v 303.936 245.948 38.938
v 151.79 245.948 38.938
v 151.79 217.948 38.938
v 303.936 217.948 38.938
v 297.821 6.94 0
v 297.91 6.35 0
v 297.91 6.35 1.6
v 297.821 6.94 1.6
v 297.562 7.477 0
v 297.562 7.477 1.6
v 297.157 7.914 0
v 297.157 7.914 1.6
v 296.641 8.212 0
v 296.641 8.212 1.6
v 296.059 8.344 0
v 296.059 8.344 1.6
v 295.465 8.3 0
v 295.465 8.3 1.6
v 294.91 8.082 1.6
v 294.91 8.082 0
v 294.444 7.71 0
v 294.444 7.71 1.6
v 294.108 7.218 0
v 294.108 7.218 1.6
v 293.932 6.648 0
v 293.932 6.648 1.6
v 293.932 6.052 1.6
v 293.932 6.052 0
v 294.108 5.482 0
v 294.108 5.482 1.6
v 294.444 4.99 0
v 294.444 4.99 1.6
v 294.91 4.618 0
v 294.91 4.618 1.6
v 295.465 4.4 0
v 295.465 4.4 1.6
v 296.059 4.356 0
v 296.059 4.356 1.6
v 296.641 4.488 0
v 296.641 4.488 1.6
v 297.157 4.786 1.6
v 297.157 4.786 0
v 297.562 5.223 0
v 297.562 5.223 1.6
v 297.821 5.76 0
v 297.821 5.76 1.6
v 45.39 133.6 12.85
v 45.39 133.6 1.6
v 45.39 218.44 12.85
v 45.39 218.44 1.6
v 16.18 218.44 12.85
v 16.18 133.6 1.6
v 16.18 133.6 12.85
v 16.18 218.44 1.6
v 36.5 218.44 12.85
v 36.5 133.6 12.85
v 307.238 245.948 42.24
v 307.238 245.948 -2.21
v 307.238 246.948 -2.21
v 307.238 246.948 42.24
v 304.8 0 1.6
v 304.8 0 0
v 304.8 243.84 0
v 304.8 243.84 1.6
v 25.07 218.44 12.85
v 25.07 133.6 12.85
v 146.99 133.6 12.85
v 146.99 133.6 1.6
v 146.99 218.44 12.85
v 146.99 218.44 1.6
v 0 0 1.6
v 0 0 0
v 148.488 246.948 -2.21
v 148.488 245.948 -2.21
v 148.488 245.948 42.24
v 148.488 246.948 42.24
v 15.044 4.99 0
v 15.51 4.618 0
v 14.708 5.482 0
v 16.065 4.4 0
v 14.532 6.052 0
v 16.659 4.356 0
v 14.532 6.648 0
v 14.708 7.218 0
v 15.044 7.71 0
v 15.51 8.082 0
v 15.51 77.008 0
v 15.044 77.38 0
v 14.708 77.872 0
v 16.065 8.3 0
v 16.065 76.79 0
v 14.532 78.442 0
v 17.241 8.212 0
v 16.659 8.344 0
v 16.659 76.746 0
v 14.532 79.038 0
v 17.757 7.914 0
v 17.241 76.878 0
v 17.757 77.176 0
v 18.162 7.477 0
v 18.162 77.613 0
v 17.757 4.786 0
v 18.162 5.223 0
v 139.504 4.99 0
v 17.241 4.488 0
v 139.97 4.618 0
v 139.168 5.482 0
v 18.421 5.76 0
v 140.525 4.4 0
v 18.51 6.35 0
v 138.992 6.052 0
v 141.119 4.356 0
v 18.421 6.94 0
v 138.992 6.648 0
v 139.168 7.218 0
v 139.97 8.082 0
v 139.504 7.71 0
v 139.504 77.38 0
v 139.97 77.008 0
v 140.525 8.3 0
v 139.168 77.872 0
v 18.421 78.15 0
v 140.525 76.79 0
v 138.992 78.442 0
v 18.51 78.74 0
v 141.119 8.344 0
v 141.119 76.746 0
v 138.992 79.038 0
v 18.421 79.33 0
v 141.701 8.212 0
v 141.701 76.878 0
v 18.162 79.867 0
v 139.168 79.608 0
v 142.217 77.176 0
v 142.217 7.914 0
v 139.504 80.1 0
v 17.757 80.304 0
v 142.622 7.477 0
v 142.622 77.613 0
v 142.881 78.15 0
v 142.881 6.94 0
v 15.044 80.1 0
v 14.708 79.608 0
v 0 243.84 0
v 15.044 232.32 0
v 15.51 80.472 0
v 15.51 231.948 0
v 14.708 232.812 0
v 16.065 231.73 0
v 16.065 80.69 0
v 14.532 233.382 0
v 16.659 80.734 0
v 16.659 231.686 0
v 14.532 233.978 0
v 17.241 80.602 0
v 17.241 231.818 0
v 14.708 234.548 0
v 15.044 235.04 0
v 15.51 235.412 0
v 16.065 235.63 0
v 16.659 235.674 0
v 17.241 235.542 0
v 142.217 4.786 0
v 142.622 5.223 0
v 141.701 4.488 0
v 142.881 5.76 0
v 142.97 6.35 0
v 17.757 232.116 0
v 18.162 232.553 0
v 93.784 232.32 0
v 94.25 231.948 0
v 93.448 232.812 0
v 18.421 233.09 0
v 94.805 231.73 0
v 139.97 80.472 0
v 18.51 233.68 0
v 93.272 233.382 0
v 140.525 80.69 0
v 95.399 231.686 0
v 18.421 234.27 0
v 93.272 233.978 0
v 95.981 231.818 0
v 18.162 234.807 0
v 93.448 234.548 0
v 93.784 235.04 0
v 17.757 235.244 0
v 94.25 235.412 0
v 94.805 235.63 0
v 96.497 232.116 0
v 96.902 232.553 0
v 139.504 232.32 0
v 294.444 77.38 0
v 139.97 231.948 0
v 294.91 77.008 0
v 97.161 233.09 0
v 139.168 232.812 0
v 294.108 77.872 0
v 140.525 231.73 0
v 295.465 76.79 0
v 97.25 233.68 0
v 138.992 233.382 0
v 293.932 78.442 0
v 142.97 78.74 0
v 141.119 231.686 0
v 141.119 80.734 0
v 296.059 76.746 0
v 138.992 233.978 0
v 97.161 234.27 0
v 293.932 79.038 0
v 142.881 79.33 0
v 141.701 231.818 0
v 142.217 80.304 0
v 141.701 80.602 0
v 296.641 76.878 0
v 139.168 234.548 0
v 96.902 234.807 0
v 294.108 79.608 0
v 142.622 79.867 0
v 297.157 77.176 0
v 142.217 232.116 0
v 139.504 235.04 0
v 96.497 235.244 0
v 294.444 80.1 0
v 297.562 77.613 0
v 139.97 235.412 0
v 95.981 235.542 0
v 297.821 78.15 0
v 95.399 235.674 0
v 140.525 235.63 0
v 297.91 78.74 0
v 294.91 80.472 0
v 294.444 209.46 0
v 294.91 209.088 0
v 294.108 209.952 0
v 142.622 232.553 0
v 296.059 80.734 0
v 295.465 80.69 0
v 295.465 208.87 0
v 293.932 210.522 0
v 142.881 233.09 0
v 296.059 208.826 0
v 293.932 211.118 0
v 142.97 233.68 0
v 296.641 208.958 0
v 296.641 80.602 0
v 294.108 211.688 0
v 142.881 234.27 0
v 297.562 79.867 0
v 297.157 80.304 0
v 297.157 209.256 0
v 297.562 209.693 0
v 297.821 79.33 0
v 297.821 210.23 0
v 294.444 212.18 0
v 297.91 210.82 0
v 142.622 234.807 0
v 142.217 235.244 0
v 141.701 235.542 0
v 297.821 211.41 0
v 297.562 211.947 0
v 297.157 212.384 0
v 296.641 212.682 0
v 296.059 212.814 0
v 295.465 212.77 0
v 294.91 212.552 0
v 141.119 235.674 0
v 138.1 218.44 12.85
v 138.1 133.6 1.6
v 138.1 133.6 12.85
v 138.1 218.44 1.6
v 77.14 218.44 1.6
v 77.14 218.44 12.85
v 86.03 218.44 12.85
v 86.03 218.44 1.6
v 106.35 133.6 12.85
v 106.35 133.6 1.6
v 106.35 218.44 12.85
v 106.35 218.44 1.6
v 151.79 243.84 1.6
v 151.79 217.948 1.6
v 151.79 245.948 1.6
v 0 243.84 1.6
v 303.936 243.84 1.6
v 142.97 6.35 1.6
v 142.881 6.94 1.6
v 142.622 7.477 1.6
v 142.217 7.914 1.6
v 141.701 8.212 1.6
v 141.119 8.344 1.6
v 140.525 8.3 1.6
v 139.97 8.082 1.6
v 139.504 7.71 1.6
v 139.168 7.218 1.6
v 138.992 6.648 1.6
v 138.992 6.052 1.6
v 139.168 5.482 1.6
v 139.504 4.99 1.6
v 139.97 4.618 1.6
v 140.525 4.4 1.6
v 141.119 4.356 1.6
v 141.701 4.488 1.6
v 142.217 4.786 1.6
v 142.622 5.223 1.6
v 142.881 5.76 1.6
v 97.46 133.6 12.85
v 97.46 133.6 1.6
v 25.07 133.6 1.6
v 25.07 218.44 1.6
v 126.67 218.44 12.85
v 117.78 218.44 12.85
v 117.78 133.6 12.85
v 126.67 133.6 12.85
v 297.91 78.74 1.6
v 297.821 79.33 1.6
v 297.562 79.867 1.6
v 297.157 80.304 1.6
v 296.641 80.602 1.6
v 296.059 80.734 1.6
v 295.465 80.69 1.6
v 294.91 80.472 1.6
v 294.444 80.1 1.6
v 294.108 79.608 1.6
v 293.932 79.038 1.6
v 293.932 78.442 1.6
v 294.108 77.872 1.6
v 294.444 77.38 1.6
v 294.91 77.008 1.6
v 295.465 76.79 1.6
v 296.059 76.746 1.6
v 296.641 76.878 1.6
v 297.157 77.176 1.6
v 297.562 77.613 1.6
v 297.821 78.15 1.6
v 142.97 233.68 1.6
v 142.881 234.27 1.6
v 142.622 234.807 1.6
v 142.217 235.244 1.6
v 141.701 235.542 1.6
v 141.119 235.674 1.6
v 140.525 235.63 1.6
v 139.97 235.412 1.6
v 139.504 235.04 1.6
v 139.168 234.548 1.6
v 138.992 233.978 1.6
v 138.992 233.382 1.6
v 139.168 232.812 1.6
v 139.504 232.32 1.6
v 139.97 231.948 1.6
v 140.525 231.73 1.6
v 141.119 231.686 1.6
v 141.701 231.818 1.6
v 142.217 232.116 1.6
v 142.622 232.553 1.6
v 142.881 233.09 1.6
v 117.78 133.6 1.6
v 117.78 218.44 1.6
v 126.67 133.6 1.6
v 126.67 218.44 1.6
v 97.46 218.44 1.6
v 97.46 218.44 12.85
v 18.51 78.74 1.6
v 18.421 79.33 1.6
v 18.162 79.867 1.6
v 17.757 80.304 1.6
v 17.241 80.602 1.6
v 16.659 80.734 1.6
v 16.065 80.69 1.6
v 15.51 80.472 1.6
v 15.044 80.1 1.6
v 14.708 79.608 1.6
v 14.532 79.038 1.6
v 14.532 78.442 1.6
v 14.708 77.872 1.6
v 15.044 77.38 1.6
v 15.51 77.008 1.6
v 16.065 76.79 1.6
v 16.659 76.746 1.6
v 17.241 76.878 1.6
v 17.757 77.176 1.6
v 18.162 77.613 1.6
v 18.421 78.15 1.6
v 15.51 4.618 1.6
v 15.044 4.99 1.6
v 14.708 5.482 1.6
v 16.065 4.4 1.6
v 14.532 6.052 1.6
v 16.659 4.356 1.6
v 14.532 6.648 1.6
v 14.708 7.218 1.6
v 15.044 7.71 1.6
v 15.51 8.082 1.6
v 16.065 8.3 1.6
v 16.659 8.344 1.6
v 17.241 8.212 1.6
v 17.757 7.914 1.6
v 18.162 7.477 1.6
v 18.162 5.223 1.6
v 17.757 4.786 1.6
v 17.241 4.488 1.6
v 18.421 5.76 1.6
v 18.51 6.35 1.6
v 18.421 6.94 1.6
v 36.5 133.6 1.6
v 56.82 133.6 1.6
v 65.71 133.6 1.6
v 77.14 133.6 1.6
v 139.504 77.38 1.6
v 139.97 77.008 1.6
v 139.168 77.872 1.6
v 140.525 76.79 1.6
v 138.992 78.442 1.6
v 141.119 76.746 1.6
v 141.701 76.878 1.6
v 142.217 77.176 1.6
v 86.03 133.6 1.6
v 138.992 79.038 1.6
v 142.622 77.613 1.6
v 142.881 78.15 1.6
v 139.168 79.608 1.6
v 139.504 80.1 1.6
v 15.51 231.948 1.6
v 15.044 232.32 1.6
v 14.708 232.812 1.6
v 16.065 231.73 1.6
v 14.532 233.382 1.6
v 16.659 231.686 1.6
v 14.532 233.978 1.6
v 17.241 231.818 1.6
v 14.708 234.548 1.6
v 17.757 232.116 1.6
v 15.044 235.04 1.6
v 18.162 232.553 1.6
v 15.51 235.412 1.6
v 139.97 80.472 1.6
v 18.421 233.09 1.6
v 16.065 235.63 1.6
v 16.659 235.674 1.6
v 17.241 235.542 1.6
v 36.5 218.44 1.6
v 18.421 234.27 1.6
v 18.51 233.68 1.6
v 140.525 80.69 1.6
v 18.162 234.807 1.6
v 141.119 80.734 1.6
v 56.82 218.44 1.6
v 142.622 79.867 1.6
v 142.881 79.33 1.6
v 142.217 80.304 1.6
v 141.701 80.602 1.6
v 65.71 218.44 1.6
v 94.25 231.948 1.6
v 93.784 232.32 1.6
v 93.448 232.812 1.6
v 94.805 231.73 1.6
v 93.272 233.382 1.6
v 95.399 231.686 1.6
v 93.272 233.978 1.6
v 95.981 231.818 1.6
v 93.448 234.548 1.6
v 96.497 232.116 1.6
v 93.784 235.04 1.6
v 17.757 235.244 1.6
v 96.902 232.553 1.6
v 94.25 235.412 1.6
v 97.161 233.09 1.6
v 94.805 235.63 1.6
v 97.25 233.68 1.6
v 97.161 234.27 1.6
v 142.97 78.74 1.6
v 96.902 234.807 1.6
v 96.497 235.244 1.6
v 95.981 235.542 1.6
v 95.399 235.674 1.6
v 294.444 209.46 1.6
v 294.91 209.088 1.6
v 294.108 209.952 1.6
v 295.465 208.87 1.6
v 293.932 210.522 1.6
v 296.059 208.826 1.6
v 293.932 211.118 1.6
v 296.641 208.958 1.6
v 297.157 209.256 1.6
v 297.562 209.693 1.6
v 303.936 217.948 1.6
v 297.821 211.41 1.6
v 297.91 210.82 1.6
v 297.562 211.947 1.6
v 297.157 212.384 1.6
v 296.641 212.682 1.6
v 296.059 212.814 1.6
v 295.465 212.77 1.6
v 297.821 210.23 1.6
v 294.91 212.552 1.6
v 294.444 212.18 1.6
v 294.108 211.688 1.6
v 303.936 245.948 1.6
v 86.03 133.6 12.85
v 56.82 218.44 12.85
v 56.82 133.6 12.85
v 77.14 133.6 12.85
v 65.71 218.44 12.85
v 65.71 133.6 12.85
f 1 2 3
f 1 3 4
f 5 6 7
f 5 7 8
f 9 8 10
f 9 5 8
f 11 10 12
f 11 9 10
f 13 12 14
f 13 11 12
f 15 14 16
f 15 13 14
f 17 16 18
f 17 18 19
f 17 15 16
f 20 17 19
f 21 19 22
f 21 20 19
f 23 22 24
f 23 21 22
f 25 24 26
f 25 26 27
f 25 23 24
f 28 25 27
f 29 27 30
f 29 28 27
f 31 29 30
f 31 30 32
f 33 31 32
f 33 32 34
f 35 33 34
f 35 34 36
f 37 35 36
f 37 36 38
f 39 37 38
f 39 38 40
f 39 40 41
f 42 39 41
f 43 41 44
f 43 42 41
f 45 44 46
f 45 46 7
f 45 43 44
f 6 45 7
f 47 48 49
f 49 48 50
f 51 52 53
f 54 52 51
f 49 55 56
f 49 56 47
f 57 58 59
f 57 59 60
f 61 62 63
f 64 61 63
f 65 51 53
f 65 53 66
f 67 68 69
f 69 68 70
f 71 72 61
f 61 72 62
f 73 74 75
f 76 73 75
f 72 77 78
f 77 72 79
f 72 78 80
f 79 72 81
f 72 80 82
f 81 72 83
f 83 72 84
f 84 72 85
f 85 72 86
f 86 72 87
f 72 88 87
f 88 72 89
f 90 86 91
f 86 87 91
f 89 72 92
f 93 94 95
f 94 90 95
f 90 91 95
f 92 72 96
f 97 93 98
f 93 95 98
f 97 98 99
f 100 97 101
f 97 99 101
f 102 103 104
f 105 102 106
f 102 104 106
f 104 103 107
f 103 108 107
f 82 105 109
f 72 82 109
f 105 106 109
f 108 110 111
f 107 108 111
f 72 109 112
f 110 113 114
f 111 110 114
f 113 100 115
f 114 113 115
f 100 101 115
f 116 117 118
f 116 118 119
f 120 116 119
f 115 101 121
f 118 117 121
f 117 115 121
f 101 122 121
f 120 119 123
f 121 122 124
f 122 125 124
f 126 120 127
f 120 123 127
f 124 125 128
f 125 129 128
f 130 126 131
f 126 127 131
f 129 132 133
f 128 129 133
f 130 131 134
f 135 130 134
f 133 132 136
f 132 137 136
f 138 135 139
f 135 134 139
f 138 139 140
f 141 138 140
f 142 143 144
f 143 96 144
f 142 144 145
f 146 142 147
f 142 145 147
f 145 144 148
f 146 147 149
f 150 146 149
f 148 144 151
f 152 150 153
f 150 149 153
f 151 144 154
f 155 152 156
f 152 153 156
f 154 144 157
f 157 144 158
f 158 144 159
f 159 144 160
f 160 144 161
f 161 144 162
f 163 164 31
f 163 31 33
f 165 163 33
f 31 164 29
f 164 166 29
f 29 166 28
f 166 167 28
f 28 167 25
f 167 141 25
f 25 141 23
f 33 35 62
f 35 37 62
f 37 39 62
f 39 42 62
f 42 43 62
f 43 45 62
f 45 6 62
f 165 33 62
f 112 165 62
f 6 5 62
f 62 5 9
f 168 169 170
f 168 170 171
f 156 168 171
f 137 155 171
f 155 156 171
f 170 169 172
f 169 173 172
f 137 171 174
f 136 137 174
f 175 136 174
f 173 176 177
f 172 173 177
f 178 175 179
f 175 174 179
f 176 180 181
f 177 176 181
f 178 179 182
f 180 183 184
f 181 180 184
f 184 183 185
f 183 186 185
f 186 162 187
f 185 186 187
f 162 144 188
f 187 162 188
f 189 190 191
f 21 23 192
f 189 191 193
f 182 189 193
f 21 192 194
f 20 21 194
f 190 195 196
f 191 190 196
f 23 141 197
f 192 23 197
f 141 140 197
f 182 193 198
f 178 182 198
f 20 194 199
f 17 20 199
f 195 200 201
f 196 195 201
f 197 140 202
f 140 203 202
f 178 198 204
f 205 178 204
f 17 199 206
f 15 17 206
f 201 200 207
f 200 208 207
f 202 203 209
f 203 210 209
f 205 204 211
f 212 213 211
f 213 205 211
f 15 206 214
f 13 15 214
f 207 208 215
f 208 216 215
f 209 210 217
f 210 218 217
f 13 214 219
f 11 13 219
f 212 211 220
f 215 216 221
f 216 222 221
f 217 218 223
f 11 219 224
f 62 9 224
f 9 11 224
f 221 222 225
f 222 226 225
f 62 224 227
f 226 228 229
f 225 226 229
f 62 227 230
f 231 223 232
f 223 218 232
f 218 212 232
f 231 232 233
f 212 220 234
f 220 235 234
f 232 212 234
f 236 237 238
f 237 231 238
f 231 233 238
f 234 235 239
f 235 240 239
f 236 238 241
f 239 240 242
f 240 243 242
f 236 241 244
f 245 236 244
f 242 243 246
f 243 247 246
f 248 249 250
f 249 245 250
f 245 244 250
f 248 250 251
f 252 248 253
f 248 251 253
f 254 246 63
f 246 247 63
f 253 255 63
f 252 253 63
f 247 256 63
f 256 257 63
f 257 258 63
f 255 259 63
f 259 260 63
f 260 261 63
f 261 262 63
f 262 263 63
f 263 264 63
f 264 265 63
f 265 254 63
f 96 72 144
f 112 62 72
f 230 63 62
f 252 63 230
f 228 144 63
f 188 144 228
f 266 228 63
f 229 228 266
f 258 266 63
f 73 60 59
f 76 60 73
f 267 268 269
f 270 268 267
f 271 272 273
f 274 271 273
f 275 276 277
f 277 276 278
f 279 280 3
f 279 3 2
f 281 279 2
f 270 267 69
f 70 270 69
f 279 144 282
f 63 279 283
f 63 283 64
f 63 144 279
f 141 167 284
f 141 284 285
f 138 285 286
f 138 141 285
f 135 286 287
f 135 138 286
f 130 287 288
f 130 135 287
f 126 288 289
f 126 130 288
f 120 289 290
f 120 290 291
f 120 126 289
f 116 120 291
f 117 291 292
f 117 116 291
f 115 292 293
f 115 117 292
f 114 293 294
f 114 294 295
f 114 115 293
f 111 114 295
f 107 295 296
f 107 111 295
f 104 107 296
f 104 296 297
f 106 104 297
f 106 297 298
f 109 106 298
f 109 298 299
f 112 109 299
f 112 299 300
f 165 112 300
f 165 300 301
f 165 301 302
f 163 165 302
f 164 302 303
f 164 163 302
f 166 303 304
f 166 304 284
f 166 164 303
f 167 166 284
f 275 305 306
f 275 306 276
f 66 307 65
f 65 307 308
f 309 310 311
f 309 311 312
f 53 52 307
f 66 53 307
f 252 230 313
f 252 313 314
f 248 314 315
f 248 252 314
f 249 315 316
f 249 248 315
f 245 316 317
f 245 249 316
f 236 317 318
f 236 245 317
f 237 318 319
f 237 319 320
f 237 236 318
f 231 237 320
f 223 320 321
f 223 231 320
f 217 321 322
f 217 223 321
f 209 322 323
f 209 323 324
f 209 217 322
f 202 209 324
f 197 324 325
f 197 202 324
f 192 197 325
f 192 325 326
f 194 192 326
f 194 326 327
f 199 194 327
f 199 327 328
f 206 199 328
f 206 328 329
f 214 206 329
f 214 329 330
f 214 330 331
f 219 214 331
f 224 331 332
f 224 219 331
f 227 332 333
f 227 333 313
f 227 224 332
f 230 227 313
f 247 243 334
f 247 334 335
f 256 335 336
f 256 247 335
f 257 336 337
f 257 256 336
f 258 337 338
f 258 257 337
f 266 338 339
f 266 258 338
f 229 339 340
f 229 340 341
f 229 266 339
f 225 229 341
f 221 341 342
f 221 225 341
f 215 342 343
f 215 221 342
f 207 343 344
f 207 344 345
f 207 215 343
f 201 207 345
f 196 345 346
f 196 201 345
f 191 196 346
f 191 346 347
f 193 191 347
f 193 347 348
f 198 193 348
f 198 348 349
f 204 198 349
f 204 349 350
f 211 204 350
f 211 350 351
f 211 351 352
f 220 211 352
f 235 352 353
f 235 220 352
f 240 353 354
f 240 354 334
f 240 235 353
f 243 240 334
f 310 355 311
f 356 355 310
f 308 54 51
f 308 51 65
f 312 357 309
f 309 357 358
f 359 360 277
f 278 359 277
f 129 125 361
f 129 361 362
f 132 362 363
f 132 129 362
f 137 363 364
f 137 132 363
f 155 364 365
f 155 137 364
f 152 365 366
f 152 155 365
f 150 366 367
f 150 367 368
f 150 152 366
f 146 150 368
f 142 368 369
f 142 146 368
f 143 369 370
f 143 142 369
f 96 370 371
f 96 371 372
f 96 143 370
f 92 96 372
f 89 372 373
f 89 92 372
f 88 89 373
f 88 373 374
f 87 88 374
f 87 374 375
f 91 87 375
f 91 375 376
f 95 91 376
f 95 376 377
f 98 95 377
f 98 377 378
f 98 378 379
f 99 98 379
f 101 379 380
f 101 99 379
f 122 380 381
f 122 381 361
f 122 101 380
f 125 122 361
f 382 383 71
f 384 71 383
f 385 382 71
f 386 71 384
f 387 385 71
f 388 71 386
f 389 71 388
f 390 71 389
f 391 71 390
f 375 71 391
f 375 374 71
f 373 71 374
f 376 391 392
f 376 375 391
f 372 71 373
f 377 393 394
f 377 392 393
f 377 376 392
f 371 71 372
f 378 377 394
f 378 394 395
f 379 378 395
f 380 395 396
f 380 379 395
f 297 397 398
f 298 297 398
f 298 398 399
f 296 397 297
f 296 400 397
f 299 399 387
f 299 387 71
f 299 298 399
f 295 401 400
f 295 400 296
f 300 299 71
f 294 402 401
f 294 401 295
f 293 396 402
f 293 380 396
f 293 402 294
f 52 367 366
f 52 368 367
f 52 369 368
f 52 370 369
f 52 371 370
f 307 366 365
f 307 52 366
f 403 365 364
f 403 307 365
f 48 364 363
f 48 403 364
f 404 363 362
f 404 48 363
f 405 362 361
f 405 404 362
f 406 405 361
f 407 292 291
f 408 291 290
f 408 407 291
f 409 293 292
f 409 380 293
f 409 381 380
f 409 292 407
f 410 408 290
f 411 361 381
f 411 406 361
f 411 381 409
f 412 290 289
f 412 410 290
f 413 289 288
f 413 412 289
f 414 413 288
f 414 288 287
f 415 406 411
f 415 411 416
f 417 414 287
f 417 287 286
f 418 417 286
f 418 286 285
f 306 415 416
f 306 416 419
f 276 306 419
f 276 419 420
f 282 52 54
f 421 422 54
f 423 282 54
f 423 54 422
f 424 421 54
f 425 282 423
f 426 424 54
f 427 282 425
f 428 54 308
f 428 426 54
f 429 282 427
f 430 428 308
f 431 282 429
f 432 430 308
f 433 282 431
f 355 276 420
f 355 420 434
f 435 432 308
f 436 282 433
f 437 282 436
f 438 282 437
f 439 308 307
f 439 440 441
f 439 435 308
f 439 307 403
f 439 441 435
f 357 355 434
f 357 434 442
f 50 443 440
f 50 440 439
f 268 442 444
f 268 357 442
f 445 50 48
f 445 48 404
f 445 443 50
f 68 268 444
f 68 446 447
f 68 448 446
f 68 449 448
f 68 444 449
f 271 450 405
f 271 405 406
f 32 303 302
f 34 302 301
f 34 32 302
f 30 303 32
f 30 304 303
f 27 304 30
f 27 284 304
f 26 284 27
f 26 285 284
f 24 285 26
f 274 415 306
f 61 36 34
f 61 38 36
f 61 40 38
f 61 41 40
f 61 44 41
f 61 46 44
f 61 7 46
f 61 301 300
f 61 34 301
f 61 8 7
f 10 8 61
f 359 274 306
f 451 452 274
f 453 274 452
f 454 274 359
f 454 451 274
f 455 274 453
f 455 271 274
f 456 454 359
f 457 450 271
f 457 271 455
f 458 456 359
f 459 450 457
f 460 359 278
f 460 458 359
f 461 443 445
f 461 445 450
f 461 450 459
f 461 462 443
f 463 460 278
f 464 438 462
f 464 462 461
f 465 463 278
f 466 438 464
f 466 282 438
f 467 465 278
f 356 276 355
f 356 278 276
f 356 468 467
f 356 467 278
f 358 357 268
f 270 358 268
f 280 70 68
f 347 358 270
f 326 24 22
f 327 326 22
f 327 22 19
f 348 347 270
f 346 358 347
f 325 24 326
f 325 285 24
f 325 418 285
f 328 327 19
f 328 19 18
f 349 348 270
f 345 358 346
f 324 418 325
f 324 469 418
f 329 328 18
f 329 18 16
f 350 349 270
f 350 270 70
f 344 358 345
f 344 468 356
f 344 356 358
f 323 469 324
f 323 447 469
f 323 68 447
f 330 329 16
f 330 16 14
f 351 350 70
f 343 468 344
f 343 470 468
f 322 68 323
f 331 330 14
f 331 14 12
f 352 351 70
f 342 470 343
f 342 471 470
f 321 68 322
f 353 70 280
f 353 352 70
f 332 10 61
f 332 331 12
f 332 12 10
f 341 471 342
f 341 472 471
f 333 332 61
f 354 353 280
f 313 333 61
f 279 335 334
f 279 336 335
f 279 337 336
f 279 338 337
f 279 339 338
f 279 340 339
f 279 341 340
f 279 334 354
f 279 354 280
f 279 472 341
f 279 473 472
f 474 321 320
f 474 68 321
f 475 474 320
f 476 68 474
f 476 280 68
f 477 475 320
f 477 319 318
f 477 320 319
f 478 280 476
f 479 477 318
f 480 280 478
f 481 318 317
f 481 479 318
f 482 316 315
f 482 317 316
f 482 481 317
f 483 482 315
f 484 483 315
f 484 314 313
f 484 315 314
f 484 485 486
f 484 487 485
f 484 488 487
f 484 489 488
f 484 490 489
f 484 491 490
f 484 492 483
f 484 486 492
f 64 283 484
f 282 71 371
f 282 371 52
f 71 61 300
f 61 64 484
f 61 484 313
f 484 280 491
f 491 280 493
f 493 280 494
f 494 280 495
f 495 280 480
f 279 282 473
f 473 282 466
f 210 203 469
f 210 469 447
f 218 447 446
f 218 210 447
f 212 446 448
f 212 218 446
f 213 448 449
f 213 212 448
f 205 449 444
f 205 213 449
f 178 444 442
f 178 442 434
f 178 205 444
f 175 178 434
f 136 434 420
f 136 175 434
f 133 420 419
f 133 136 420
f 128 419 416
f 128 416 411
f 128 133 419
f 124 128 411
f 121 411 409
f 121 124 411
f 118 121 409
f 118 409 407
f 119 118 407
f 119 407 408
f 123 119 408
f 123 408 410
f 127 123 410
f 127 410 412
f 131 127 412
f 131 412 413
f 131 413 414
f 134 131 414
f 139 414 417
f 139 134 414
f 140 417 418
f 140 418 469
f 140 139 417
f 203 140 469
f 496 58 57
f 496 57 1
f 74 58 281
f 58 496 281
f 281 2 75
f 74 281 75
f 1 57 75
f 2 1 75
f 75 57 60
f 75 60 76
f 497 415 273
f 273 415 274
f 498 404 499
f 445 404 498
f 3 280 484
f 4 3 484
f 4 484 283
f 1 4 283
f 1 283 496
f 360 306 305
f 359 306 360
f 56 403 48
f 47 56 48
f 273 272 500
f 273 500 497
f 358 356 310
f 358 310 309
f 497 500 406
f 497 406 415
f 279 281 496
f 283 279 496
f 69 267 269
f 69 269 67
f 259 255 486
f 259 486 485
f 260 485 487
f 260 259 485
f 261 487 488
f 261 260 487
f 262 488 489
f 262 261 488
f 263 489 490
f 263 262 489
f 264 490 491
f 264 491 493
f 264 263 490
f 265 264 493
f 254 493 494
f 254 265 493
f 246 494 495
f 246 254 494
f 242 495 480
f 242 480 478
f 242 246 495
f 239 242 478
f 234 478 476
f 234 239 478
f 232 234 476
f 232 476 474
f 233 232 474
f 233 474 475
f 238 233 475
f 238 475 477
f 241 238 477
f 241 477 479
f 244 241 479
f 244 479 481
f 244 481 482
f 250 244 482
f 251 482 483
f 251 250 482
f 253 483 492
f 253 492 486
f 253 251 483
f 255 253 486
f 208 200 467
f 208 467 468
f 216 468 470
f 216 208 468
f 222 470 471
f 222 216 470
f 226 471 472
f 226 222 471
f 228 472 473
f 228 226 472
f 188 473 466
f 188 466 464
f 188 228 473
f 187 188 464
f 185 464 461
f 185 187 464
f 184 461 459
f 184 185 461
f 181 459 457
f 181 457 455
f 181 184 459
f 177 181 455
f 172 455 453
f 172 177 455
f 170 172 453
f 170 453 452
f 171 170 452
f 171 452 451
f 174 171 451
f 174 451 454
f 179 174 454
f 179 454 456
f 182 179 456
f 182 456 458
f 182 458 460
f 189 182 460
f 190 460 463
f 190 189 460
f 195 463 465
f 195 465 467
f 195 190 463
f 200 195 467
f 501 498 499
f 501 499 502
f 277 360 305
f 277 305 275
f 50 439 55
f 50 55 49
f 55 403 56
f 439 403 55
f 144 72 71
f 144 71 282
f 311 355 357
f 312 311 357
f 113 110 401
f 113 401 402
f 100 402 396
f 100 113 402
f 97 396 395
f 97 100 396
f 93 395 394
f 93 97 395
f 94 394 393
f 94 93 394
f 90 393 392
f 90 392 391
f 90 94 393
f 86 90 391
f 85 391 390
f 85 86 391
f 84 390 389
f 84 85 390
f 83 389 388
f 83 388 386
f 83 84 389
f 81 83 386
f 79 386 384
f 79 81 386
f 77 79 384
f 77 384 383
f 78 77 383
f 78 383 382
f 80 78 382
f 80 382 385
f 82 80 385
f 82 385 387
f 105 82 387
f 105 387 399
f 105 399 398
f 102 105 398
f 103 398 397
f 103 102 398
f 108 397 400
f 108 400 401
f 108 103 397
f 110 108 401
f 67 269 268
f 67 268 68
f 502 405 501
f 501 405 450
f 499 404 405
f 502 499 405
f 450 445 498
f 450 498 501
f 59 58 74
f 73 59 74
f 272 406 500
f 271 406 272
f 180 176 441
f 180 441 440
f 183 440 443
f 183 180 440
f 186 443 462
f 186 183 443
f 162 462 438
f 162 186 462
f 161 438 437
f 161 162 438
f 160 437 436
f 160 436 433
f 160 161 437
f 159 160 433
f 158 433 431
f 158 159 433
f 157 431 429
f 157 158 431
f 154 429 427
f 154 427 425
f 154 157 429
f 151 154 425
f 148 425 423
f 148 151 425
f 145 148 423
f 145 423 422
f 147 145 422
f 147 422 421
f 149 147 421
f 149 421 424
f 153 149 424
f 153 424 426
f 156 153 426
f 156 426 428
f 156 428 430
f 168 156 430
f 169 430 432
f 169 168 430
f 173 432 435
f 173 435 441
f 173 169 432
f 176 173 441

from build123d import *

# Parameters (mm, degrees)
F0_W     = 304.8
F0_H     = 243.84
F0_R     = 2
F1_DEPTH = 1.6
F2_W     = 8.89
F2_H     = 84.84
F3_DEPTH = 11.25
F4_W     = 152.146
F4_H     = 28
F5_DEPTH = 37.338
F6_W     = 158.75
F6_H     = 44.45
F7_DEPTH = 1


with BuildPart() as f1:
    # F0 (on Top) → F1 (new body)
    with BuildSketch(Plane.XY):
        with Locations((152.4, 121.92)):
            Rectangle(F0_W, F0_H)
        with Locations((16.51, 6.35)):
            Circle(F0_R, mode=Mode.SUBTRACT)
        with Locations((140.97, 6.35)):
            Circle(F0_R, mode=Mode.SUBTRACT)
        with Locations((16.51, 78.74)):
            Circle(F0_R, mode=Mode.SUBTRACT)
        with Locations((140.97, 78.74)):
            Circle(F0_R, mode=Mode.SUBTRACT)
        with Locations((295.91, 6.35)):
            Circle(F0_R, mode=Mode.SUBTRACT)
        with Locations((295.91, 78.74)):
            Circle(F0_R, mode=Mode.SUBTRACT)
        with Locations((16.51, 233.68)):
            Circle(F0_R, mode=Mode.SUBTRACT)
        with Locations((95.25, 233.68)):
            Circle(F0_R, mode=Mode.SUBTRACT)
        with Locations((140.97, 233.68)):
            Circle(F0_R, mode=Mode.SUBTRACT)
        with Locations((295.91, 210.82)):
            Circle(F0_R, mode=Mode.SUBTRACT)
    extrude(amount=F1_DEPTH)

    # F2 (on face) → F3 (join)
    with BuildSketch(Plane.XY.offset(1.6)):
        with Locations((122.2248, 176.02)):
            Rectangle(F2_W, F2_H)
        with Locations((142.5448, 176.02)):
            Rectangle(F2_W, F2_H)
        with Locations((81.5848, 176.02)):
            Rectangle(F2_W, F2_H)
        with Locations((101.9048, 176.02)):
            Rectangle(F2_W, F2_H)
        with Locations((40.9448, 176.02)):
            Rectangle(F2_W, F2_H)
        with Locations((61.2648, 176.02)):
            Rectangle(F2_W, F2_H)
        with Locations((20.6248, 176.02)):
            Rectangle(F2_W, F2_H)
    extrude(amount=F3_DEPTH)

    # F4 (on face) → F5 (join)
    with BuildSketch(Plane.XY.offset(1.6)):
        with Locations((227.8634, 231.9482)):
            Rectangle(F4_W, F4_H)
    extrude(amount=F5_DEPTH)

    # F6 (on face) → F7 (join)
    with BuildSketch(Plane(origin=(0, 245.9482, 0), x_dir=(-1, 0, 0), z_dir=(0, 1, 0))):
        with Locations((-227.8634, 20.015)):
            Rectangle(F6_W, F6_H)
    extrude(amount=F7_DEPTH)


solid = f1.part
